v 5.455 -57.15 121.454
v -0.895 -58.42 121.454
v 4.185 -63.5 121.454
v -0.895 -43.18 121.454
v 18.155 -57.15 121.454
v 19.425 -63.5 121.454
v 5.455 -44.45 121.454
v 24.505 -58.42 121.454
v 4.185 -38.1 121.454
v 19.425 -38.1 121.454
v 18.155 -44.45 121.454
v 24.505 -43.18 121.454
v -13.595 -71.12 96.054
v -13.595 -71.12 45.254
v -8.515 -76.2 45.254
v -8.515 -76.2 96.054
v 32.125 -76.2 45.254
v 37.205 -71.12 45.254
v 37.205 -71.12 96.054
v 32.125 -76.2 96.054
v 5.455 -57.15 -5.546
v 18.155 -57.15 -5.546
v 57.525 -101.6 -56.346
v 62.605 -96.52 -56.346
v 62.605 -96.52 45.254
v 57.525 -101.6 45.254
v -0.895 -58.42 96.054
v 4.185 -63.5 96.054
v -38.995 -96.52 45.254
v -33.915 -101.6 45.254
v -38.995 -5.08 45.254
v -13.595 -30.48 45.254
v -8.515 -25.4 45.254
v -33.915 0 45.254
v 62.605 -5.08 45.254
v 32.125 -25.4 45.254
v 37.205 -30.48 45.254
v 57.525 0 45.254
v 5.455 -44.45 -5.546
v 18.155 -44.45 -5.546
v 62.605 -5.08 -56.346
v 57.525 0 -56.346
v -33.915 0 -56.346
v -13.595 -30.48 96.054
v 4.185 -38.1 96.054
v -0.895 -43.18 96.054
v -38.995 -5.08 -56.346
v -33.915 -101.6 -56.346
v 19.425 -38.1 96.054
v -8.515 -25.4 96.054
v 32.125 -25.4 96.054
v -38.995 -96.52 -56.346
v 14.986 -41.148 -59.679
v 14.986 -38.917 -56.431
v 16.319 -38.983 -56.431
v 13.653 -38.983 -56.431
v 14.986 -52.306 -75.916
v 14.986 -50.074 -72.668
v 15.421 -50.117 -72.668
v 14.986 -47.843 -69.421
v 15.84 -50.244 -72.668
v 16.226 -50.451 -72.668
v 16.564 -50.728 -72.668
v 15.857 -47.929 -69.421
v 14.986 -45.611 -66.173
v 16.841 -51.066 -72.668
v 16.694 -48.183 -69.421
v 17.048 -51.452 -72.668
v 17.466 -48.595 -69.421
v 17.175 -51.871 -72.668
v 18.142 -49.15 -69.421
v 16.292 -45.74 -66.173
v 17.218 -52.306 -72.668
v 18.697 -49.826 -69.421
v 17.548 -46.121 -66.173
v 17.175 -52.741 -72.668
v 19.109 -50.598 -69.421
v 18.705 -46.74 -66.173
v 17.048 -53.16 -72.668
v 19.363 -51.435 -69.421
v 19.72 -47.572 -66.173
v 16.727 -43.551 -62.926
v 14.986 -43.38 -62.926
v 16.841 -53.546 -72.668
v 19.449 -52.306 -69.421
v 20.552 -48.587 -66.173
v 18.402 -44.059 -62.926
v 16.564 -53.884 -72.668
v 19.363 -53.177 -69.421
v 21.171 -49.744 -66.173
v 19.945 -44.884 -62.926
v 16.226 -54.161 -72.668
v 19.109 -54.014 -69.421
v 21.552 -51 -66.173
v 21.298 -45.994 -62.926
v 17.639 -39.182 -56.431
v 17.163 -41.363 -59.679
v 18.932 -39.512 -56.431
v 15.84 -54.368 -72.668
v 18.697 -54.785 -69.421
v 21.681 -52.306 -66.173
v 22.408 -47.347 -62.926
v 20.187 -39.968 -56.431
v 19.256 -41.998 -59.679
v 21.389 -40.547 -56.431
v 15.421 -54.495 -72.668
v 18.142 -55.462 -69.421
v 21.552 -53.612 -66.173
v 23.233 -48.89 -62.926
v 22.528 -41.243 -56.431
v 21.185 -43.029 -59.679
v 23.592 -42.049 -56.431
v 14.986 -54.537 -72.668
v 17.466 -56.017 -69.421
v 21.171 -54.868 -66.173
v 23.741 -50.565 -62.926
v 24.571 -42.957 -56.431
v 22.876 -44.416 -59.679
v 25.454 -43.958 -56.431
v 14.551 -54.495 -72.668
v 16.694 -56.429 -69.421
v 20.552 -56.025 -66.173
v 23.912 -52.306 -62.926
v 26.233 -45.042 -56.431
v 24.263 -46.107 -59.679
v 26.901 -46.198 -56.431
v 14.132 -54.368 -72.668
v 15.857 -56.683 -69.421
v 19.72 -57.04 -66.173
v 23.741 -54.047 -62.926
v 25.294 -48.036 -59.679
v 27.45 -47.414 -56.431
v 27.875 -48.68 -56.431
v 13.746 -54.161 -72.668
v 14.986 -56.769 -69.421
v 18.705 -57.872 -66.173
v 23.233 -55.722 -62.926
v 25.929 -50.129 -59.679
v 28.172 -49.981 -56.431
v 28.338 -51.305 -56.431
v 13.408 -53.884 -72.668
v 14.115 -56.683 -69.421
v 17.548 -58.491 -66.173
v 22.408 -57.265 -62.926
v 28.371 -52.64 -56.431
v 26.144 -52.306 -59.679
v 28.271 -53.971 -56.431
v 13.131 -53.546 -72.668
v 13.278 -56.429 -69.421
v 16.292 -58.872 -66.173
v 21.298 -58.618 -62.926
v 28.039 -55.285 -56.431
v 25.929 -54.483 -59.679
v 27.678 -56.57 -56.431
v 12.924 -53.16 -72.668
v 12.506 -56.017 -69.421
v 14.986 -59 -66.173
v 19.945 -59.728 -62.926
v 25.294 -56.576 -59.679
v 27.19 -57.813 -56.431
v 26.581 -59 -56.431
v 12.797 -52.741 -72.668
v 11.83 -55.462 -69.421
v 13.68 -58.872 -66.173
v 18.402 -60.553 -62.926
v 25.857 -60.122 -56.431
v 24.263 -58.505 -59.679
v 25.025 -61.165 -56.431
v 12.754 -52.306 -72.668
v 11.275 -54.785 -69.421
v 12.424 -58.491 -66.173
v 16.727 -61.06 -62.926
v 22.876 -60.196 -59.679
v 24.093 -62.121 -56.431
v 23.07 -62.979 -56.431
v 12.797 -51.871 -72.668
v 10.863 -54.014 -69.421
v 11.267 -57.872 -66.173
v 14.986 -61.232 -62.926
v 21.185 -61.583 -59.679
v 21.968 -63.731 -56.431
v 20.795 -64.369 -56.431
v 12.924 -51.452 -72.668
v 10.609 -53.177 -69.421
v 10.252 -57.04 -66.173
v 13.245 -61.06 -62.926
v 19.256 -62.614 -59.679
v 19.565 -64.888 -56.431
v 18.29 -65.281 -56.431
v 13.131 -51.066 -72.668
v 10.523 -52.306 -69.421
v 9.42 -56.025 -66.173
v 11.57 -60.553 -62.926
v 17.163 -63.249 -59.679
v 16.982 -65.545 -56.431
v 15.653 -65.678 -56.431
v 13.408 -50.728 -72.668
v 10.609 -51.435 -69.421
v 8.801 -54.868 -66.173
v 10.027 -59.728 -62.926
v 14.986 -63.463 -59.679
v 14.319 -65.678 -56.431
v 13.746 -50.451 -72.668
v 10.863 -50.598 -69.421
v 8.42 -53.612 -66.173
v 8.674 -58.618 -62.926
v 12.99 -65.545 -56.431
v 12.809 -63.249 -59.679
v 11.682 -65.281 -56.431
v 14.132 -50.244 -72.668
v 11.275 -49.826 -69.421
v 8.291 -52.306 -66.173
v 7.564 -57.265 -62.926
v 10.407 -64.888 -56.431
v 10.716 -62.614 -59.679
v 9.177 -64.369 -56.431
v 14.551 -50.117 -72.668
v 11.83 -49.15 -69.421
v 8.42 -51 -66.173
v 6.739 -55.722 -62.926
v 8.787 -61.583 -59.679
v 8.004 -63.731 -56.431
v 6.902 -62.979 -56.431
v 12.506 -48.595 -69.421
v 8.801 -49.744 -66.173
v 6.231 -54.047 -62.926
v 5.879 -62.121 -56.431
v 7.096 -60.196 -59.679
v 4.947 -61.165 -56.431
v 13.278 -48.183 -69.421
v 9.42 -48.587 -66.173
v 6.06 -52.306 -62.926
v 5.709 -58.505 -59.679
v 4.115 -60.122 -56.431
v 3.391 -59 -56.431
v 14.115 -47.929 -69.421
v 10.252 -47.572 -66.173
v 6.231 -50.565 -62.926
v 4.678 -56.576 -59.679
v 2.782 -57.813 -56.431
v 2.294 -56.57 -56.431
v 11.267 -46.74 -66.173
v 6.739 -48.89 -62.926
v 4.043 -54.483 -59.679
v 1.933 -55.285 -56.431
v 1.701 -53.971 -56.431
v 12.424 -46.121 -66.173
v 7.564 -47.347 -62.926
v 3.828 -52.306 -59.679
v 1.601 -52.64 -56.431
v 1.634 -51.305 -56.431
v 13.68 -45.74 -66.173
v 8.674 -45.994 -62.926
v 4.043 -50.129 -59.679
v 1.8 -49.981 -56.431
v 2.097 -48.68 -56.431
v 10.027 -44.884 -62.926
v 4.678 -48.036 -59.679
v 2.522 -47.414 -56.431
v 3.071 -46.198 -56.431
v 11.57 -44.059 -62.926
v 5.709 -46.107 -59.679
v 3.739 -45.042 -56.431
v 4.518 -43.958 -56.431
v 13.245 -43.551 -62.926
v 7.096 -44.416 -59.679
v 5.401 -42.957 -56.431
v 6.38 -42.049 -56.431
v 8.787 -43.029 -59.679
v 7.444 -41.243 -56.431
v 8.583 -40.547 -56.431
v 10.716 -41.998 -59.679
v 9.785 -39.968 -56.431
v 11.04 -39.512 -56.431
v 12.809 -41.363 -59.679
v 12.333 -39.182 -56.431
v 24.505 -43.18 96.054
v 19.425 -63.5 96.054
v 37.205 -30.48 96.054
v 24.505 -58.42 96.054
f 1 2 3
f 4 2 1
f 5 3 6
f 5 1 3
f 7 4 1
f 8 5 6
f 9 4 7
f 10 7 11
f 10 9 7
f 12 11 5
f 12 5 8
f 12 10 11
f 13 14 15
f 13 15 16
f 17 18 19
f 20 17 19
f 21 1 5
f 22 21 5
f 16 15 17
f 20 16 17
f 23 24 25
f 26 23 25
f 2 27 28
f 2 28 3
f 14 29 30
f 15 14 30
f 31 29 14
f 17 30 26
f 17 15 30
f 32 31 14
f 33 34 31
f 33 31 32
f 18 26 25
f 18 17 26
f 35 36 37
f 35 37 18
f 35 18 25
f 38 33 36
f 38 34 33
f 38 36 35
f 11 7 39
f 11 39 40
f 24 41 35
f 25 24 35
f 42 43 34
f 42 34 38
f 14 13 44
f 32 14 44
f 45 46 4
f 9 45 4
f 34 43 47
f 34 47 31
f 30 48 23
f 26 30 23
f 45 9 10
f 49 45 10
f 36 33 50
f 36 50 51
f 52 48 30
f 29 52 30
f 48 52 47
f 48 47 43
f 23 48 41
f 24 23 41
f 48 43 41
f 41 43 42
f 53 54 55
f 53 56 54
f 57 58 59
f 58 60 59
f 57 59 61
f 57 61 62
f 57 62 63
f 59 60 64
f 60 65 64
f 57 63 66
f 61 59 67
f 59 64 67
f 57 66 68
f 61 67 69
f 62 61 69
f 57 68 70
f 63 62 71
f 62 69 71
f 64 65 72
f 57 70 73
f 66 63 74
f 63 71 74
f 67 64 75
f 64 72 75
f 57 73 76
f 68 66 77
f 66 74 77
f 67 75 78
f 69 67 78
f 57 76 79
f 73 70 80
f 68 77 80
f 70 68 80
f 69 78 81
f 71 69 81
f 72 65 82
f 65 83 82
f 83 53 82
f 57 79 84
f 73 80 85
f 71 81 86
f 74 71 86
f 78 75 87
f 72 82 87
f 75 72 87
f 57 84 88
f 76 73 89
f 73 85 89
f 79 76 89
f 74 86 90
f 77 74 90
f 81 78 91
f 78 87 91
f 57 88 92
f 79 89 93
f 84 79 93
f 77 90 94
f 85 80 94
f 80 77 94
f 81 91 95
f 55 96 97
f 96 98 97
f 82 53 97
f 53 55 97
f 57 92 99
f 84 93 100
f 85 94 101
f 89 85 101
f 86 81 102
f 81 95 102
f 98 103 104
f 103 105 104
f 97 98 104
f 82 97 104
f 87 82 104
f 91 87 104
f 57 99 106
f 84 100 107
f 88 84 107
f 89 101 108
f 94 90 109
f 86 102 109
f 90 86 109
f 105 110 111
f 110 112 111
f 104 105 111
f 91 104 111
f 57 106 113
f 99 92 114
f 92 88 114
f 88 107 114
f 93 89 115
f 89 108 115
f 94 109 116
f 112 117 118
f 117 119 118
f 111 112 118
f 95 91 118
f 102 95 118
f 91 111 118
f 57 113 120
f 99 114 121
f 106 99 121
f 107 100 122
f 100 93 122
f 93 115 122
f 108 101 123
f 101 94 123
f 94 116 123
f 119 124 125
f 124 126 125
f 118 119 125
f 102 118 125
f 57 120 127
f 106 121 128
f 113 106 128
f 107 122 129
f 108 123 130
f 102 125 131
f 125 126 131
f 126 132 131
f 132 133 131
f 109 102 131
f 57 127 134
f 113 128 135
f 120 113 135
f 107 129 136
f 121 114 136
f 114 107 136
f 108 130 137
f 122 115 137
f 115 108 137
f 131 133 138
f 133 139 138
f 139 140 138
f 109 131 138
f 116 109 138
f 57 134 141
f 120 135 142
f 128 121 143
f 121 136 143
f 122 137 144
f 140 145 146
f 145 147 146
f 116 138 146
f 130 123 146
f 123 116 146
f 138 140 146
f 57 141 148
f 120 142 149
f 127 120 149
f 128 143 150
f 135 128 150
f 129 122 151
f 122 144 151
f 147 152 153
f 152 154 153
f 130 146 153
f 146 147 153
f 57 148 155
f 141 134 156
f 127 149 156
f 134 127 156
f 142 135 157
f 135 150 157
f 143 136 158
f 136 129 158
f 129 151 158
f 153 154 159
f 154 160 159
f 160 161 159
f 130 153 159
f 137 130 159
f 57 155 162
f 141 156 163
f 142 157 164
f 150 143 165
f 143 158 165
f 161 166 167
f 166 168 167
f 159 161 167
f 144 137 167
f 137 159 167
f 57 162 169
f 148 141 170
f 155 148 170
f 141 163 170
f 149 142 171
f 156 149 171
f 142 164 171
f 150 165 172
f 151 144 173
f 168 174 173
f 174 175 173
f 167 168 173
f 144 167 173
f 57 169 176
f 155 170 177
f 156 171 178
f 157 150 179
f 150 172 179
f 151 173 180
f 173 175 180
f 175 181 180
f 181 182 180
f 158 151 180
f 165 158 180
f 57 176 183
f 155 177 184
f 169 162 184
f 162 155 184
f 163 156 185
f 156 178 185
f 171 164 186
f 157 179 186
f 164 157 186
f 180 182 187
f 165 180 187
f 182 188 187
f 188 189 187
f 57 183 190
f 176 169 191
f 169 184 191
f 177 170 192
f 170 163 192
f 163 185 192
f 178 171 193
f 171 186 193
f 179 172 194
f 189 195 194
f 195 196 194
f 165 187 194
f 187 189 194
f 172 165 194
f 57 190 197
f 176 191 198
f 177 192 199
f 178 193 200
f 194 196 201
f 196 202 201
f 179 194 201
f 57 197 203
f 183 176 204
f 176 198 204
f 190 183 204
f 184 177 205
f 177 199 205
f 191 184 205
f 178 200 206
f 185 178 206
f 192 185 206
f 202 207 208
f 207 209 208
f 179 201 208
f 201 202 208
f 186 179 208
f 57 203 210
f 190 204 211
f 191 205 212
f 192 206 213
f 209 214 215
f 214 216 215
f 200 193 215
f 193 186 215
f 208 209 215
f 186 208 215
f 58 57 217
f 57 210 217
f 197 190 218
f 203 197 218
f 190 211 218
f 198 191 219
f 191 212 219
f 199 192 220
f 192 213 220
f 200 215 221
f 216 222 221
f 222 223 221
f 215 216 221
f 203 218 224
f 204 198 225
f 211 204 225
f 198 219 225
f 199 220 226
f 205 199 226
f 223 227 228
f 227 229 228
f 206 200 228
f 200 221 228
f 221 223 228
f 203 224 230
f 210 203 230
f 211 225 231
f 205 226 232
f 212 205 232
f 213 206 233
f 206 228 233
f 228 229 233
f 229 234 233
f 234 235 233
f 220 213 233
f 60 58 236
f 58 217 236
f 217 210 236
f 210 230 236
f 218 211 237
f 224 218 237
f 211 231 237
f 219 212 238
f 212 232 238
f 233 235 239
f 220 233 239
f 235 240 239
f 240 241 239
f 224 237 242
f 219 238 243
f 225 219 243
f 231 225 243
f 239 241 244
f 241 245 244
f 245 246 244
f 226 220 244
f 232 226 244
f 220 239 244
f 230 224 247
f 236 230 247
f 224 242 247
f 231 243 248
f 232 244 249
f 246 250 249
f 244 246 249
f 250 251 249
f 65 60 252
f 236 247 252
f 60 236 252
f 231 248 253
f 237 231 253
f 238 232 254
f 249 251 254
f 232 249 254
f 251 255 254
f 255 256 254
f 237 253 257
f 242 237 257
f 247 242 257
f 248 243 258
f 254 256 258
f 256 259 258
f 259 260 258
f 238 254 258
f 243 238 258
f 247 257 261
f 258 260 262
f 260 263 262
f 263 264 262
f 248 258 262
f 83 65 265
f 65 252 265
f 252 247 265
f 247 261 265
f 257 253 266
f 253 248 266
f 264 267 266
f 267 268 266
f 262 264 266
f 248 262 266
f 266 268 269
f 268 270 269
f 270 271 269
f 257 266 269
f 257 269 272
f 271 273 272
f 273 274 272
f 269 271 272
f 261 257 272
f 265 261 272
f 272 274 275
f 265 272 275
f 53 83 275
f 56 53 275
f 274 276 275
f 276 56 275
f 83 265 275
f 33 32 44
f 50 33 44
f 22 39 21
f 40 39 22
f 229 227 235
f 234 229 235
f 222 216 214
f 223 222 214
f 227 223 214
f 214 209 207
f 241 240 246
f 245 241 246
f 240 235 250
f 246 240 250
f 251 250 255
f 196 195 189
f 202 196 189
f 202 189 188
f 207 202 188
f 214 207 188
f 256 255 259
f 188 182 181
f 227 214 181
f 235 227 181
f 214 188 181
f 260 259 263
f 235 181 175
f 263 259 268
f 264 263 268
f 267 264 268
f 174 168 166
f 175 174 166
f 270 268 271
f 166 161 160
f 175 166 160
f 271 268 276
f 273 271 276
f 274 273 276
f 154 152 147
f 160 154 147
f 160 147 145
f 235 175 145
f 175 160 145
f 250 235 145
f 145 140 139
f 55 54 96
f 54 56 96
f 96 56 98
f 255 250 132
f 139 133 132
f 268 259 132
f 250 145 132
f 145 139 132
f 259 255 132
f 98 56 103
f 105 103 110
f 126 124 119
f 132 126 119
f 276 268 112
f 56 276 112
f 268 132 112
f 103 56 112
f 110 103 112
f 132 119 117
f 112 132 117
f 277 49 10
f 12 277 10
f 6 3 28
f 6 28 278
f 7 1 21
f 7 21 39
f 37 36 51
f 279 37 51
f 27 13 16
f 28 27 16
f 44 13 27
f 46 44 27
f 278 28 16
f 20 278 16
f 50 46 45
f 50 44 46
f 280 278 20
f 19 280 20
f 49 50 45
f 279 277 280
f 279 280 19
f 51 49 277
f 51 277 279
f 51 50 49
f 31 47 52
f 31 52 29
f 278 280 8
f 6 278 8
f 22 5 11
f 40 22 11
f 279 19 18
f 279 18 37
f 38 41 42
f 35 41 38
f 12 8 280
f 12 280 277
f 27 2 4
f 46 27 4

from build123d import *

# Parameters (mm, degrees)
F0_W     = 101.6
F0_H     = 101.6
F1_DEPTH = 101.6
F2_W     = 50.8
F2_H     = 50.8
F3_DEPTH = 50.8
F4_W     = 25.4
F4_H     = 25.4
F5_DEPTH = 25.4
F6_W     = 12.7
F6_H     = 12.7
F7_DEPTH = 127
F8_SIZE  = 5.08
F9_SIZE  = 5.08


with BuildPart() as f1:
    # F0 (on Front) → F1 (new body)
    with BuildSketch(Plane.XZ):
        with Locations((11.804756, -5.545579)):
            Rectangle(F0_W, F0_H)
    extrude(amount=F1_DEPTH)

    # F2 (on face) → F3 (join)
    with BuildSketch(Plane.XY.offset(45.254421)):
        with Locations((11.804756, -50.8)):
            Rectangle(F2_W, F2_H)
    extrude(amount=F3_DEPTH)

    # F4 (on face) → F5 (join)
    with BuildSketch(Plane.XY.offset(96.054421)):
        with Locations((11.804756, -50.8)):
            Rectangle(F4_W, F4_H)
    extrude(amount=F5_DEPTH)

    # F6 (on face) → F7 (cut)
    with BuildSketch(Plane.XY.offset(121.454421)):
        with Locations((11.804756, -50.8)):
            Rectangle(F6_W, F6_H)
    extrude(amount=-F7_DEPTH, mode=Mode.SUBTRACT)

    # F8
    f8_edges = [f1.edges().sort_by_distance(p)[0] for p in [
        (-38.995244, 0, -5.545579),
        (62.604756, 0, -5.545579),
        (62.604756, -101.6, -5.545579),
        (-38.995244, -101.6, -5.545579),
    ]]
    chamfer(f8_edges, length=F8_SIZE)

    # F9
    f9_edges = [f1.edges().sort_by_distance(p)[0] for p in [
        (37.204756, -76.2, 70.654421),
        (37.204756, -25.4, 70.654421),
        (-13.595244, -25.4, 70.654421),
        (-13.595244, -76.2, 70.654421),
        (-0.895244, -63.5, 108.754421),
        (-0.895244, -38.1, 108.754421),
        (24.504756, -63.5, 108.754421),
        (24.504756, -38.1, 108.754421),
    ]]
    chamfer(f9_edges, length=F9_SIZE)


with BuildPart() as f11:
    # F10 (on Right) → F11 (revolve)
    with BuildSketch(Plane.YZ):
        Polygon((-52.632906, -56.431413), (-66.021942, -56.431413), (-66.021942, -75.915575), align=None)
    revolve(axis=Axis((0, -66.021942, -66.173494), (0, 0, -1)))


with BuildPart() as f11_1:
    # F12: moved
    add(f11.part.moved(Location((14.986, 13.716, 0))))


solid = Compound([f1.part, f11_1.part])
